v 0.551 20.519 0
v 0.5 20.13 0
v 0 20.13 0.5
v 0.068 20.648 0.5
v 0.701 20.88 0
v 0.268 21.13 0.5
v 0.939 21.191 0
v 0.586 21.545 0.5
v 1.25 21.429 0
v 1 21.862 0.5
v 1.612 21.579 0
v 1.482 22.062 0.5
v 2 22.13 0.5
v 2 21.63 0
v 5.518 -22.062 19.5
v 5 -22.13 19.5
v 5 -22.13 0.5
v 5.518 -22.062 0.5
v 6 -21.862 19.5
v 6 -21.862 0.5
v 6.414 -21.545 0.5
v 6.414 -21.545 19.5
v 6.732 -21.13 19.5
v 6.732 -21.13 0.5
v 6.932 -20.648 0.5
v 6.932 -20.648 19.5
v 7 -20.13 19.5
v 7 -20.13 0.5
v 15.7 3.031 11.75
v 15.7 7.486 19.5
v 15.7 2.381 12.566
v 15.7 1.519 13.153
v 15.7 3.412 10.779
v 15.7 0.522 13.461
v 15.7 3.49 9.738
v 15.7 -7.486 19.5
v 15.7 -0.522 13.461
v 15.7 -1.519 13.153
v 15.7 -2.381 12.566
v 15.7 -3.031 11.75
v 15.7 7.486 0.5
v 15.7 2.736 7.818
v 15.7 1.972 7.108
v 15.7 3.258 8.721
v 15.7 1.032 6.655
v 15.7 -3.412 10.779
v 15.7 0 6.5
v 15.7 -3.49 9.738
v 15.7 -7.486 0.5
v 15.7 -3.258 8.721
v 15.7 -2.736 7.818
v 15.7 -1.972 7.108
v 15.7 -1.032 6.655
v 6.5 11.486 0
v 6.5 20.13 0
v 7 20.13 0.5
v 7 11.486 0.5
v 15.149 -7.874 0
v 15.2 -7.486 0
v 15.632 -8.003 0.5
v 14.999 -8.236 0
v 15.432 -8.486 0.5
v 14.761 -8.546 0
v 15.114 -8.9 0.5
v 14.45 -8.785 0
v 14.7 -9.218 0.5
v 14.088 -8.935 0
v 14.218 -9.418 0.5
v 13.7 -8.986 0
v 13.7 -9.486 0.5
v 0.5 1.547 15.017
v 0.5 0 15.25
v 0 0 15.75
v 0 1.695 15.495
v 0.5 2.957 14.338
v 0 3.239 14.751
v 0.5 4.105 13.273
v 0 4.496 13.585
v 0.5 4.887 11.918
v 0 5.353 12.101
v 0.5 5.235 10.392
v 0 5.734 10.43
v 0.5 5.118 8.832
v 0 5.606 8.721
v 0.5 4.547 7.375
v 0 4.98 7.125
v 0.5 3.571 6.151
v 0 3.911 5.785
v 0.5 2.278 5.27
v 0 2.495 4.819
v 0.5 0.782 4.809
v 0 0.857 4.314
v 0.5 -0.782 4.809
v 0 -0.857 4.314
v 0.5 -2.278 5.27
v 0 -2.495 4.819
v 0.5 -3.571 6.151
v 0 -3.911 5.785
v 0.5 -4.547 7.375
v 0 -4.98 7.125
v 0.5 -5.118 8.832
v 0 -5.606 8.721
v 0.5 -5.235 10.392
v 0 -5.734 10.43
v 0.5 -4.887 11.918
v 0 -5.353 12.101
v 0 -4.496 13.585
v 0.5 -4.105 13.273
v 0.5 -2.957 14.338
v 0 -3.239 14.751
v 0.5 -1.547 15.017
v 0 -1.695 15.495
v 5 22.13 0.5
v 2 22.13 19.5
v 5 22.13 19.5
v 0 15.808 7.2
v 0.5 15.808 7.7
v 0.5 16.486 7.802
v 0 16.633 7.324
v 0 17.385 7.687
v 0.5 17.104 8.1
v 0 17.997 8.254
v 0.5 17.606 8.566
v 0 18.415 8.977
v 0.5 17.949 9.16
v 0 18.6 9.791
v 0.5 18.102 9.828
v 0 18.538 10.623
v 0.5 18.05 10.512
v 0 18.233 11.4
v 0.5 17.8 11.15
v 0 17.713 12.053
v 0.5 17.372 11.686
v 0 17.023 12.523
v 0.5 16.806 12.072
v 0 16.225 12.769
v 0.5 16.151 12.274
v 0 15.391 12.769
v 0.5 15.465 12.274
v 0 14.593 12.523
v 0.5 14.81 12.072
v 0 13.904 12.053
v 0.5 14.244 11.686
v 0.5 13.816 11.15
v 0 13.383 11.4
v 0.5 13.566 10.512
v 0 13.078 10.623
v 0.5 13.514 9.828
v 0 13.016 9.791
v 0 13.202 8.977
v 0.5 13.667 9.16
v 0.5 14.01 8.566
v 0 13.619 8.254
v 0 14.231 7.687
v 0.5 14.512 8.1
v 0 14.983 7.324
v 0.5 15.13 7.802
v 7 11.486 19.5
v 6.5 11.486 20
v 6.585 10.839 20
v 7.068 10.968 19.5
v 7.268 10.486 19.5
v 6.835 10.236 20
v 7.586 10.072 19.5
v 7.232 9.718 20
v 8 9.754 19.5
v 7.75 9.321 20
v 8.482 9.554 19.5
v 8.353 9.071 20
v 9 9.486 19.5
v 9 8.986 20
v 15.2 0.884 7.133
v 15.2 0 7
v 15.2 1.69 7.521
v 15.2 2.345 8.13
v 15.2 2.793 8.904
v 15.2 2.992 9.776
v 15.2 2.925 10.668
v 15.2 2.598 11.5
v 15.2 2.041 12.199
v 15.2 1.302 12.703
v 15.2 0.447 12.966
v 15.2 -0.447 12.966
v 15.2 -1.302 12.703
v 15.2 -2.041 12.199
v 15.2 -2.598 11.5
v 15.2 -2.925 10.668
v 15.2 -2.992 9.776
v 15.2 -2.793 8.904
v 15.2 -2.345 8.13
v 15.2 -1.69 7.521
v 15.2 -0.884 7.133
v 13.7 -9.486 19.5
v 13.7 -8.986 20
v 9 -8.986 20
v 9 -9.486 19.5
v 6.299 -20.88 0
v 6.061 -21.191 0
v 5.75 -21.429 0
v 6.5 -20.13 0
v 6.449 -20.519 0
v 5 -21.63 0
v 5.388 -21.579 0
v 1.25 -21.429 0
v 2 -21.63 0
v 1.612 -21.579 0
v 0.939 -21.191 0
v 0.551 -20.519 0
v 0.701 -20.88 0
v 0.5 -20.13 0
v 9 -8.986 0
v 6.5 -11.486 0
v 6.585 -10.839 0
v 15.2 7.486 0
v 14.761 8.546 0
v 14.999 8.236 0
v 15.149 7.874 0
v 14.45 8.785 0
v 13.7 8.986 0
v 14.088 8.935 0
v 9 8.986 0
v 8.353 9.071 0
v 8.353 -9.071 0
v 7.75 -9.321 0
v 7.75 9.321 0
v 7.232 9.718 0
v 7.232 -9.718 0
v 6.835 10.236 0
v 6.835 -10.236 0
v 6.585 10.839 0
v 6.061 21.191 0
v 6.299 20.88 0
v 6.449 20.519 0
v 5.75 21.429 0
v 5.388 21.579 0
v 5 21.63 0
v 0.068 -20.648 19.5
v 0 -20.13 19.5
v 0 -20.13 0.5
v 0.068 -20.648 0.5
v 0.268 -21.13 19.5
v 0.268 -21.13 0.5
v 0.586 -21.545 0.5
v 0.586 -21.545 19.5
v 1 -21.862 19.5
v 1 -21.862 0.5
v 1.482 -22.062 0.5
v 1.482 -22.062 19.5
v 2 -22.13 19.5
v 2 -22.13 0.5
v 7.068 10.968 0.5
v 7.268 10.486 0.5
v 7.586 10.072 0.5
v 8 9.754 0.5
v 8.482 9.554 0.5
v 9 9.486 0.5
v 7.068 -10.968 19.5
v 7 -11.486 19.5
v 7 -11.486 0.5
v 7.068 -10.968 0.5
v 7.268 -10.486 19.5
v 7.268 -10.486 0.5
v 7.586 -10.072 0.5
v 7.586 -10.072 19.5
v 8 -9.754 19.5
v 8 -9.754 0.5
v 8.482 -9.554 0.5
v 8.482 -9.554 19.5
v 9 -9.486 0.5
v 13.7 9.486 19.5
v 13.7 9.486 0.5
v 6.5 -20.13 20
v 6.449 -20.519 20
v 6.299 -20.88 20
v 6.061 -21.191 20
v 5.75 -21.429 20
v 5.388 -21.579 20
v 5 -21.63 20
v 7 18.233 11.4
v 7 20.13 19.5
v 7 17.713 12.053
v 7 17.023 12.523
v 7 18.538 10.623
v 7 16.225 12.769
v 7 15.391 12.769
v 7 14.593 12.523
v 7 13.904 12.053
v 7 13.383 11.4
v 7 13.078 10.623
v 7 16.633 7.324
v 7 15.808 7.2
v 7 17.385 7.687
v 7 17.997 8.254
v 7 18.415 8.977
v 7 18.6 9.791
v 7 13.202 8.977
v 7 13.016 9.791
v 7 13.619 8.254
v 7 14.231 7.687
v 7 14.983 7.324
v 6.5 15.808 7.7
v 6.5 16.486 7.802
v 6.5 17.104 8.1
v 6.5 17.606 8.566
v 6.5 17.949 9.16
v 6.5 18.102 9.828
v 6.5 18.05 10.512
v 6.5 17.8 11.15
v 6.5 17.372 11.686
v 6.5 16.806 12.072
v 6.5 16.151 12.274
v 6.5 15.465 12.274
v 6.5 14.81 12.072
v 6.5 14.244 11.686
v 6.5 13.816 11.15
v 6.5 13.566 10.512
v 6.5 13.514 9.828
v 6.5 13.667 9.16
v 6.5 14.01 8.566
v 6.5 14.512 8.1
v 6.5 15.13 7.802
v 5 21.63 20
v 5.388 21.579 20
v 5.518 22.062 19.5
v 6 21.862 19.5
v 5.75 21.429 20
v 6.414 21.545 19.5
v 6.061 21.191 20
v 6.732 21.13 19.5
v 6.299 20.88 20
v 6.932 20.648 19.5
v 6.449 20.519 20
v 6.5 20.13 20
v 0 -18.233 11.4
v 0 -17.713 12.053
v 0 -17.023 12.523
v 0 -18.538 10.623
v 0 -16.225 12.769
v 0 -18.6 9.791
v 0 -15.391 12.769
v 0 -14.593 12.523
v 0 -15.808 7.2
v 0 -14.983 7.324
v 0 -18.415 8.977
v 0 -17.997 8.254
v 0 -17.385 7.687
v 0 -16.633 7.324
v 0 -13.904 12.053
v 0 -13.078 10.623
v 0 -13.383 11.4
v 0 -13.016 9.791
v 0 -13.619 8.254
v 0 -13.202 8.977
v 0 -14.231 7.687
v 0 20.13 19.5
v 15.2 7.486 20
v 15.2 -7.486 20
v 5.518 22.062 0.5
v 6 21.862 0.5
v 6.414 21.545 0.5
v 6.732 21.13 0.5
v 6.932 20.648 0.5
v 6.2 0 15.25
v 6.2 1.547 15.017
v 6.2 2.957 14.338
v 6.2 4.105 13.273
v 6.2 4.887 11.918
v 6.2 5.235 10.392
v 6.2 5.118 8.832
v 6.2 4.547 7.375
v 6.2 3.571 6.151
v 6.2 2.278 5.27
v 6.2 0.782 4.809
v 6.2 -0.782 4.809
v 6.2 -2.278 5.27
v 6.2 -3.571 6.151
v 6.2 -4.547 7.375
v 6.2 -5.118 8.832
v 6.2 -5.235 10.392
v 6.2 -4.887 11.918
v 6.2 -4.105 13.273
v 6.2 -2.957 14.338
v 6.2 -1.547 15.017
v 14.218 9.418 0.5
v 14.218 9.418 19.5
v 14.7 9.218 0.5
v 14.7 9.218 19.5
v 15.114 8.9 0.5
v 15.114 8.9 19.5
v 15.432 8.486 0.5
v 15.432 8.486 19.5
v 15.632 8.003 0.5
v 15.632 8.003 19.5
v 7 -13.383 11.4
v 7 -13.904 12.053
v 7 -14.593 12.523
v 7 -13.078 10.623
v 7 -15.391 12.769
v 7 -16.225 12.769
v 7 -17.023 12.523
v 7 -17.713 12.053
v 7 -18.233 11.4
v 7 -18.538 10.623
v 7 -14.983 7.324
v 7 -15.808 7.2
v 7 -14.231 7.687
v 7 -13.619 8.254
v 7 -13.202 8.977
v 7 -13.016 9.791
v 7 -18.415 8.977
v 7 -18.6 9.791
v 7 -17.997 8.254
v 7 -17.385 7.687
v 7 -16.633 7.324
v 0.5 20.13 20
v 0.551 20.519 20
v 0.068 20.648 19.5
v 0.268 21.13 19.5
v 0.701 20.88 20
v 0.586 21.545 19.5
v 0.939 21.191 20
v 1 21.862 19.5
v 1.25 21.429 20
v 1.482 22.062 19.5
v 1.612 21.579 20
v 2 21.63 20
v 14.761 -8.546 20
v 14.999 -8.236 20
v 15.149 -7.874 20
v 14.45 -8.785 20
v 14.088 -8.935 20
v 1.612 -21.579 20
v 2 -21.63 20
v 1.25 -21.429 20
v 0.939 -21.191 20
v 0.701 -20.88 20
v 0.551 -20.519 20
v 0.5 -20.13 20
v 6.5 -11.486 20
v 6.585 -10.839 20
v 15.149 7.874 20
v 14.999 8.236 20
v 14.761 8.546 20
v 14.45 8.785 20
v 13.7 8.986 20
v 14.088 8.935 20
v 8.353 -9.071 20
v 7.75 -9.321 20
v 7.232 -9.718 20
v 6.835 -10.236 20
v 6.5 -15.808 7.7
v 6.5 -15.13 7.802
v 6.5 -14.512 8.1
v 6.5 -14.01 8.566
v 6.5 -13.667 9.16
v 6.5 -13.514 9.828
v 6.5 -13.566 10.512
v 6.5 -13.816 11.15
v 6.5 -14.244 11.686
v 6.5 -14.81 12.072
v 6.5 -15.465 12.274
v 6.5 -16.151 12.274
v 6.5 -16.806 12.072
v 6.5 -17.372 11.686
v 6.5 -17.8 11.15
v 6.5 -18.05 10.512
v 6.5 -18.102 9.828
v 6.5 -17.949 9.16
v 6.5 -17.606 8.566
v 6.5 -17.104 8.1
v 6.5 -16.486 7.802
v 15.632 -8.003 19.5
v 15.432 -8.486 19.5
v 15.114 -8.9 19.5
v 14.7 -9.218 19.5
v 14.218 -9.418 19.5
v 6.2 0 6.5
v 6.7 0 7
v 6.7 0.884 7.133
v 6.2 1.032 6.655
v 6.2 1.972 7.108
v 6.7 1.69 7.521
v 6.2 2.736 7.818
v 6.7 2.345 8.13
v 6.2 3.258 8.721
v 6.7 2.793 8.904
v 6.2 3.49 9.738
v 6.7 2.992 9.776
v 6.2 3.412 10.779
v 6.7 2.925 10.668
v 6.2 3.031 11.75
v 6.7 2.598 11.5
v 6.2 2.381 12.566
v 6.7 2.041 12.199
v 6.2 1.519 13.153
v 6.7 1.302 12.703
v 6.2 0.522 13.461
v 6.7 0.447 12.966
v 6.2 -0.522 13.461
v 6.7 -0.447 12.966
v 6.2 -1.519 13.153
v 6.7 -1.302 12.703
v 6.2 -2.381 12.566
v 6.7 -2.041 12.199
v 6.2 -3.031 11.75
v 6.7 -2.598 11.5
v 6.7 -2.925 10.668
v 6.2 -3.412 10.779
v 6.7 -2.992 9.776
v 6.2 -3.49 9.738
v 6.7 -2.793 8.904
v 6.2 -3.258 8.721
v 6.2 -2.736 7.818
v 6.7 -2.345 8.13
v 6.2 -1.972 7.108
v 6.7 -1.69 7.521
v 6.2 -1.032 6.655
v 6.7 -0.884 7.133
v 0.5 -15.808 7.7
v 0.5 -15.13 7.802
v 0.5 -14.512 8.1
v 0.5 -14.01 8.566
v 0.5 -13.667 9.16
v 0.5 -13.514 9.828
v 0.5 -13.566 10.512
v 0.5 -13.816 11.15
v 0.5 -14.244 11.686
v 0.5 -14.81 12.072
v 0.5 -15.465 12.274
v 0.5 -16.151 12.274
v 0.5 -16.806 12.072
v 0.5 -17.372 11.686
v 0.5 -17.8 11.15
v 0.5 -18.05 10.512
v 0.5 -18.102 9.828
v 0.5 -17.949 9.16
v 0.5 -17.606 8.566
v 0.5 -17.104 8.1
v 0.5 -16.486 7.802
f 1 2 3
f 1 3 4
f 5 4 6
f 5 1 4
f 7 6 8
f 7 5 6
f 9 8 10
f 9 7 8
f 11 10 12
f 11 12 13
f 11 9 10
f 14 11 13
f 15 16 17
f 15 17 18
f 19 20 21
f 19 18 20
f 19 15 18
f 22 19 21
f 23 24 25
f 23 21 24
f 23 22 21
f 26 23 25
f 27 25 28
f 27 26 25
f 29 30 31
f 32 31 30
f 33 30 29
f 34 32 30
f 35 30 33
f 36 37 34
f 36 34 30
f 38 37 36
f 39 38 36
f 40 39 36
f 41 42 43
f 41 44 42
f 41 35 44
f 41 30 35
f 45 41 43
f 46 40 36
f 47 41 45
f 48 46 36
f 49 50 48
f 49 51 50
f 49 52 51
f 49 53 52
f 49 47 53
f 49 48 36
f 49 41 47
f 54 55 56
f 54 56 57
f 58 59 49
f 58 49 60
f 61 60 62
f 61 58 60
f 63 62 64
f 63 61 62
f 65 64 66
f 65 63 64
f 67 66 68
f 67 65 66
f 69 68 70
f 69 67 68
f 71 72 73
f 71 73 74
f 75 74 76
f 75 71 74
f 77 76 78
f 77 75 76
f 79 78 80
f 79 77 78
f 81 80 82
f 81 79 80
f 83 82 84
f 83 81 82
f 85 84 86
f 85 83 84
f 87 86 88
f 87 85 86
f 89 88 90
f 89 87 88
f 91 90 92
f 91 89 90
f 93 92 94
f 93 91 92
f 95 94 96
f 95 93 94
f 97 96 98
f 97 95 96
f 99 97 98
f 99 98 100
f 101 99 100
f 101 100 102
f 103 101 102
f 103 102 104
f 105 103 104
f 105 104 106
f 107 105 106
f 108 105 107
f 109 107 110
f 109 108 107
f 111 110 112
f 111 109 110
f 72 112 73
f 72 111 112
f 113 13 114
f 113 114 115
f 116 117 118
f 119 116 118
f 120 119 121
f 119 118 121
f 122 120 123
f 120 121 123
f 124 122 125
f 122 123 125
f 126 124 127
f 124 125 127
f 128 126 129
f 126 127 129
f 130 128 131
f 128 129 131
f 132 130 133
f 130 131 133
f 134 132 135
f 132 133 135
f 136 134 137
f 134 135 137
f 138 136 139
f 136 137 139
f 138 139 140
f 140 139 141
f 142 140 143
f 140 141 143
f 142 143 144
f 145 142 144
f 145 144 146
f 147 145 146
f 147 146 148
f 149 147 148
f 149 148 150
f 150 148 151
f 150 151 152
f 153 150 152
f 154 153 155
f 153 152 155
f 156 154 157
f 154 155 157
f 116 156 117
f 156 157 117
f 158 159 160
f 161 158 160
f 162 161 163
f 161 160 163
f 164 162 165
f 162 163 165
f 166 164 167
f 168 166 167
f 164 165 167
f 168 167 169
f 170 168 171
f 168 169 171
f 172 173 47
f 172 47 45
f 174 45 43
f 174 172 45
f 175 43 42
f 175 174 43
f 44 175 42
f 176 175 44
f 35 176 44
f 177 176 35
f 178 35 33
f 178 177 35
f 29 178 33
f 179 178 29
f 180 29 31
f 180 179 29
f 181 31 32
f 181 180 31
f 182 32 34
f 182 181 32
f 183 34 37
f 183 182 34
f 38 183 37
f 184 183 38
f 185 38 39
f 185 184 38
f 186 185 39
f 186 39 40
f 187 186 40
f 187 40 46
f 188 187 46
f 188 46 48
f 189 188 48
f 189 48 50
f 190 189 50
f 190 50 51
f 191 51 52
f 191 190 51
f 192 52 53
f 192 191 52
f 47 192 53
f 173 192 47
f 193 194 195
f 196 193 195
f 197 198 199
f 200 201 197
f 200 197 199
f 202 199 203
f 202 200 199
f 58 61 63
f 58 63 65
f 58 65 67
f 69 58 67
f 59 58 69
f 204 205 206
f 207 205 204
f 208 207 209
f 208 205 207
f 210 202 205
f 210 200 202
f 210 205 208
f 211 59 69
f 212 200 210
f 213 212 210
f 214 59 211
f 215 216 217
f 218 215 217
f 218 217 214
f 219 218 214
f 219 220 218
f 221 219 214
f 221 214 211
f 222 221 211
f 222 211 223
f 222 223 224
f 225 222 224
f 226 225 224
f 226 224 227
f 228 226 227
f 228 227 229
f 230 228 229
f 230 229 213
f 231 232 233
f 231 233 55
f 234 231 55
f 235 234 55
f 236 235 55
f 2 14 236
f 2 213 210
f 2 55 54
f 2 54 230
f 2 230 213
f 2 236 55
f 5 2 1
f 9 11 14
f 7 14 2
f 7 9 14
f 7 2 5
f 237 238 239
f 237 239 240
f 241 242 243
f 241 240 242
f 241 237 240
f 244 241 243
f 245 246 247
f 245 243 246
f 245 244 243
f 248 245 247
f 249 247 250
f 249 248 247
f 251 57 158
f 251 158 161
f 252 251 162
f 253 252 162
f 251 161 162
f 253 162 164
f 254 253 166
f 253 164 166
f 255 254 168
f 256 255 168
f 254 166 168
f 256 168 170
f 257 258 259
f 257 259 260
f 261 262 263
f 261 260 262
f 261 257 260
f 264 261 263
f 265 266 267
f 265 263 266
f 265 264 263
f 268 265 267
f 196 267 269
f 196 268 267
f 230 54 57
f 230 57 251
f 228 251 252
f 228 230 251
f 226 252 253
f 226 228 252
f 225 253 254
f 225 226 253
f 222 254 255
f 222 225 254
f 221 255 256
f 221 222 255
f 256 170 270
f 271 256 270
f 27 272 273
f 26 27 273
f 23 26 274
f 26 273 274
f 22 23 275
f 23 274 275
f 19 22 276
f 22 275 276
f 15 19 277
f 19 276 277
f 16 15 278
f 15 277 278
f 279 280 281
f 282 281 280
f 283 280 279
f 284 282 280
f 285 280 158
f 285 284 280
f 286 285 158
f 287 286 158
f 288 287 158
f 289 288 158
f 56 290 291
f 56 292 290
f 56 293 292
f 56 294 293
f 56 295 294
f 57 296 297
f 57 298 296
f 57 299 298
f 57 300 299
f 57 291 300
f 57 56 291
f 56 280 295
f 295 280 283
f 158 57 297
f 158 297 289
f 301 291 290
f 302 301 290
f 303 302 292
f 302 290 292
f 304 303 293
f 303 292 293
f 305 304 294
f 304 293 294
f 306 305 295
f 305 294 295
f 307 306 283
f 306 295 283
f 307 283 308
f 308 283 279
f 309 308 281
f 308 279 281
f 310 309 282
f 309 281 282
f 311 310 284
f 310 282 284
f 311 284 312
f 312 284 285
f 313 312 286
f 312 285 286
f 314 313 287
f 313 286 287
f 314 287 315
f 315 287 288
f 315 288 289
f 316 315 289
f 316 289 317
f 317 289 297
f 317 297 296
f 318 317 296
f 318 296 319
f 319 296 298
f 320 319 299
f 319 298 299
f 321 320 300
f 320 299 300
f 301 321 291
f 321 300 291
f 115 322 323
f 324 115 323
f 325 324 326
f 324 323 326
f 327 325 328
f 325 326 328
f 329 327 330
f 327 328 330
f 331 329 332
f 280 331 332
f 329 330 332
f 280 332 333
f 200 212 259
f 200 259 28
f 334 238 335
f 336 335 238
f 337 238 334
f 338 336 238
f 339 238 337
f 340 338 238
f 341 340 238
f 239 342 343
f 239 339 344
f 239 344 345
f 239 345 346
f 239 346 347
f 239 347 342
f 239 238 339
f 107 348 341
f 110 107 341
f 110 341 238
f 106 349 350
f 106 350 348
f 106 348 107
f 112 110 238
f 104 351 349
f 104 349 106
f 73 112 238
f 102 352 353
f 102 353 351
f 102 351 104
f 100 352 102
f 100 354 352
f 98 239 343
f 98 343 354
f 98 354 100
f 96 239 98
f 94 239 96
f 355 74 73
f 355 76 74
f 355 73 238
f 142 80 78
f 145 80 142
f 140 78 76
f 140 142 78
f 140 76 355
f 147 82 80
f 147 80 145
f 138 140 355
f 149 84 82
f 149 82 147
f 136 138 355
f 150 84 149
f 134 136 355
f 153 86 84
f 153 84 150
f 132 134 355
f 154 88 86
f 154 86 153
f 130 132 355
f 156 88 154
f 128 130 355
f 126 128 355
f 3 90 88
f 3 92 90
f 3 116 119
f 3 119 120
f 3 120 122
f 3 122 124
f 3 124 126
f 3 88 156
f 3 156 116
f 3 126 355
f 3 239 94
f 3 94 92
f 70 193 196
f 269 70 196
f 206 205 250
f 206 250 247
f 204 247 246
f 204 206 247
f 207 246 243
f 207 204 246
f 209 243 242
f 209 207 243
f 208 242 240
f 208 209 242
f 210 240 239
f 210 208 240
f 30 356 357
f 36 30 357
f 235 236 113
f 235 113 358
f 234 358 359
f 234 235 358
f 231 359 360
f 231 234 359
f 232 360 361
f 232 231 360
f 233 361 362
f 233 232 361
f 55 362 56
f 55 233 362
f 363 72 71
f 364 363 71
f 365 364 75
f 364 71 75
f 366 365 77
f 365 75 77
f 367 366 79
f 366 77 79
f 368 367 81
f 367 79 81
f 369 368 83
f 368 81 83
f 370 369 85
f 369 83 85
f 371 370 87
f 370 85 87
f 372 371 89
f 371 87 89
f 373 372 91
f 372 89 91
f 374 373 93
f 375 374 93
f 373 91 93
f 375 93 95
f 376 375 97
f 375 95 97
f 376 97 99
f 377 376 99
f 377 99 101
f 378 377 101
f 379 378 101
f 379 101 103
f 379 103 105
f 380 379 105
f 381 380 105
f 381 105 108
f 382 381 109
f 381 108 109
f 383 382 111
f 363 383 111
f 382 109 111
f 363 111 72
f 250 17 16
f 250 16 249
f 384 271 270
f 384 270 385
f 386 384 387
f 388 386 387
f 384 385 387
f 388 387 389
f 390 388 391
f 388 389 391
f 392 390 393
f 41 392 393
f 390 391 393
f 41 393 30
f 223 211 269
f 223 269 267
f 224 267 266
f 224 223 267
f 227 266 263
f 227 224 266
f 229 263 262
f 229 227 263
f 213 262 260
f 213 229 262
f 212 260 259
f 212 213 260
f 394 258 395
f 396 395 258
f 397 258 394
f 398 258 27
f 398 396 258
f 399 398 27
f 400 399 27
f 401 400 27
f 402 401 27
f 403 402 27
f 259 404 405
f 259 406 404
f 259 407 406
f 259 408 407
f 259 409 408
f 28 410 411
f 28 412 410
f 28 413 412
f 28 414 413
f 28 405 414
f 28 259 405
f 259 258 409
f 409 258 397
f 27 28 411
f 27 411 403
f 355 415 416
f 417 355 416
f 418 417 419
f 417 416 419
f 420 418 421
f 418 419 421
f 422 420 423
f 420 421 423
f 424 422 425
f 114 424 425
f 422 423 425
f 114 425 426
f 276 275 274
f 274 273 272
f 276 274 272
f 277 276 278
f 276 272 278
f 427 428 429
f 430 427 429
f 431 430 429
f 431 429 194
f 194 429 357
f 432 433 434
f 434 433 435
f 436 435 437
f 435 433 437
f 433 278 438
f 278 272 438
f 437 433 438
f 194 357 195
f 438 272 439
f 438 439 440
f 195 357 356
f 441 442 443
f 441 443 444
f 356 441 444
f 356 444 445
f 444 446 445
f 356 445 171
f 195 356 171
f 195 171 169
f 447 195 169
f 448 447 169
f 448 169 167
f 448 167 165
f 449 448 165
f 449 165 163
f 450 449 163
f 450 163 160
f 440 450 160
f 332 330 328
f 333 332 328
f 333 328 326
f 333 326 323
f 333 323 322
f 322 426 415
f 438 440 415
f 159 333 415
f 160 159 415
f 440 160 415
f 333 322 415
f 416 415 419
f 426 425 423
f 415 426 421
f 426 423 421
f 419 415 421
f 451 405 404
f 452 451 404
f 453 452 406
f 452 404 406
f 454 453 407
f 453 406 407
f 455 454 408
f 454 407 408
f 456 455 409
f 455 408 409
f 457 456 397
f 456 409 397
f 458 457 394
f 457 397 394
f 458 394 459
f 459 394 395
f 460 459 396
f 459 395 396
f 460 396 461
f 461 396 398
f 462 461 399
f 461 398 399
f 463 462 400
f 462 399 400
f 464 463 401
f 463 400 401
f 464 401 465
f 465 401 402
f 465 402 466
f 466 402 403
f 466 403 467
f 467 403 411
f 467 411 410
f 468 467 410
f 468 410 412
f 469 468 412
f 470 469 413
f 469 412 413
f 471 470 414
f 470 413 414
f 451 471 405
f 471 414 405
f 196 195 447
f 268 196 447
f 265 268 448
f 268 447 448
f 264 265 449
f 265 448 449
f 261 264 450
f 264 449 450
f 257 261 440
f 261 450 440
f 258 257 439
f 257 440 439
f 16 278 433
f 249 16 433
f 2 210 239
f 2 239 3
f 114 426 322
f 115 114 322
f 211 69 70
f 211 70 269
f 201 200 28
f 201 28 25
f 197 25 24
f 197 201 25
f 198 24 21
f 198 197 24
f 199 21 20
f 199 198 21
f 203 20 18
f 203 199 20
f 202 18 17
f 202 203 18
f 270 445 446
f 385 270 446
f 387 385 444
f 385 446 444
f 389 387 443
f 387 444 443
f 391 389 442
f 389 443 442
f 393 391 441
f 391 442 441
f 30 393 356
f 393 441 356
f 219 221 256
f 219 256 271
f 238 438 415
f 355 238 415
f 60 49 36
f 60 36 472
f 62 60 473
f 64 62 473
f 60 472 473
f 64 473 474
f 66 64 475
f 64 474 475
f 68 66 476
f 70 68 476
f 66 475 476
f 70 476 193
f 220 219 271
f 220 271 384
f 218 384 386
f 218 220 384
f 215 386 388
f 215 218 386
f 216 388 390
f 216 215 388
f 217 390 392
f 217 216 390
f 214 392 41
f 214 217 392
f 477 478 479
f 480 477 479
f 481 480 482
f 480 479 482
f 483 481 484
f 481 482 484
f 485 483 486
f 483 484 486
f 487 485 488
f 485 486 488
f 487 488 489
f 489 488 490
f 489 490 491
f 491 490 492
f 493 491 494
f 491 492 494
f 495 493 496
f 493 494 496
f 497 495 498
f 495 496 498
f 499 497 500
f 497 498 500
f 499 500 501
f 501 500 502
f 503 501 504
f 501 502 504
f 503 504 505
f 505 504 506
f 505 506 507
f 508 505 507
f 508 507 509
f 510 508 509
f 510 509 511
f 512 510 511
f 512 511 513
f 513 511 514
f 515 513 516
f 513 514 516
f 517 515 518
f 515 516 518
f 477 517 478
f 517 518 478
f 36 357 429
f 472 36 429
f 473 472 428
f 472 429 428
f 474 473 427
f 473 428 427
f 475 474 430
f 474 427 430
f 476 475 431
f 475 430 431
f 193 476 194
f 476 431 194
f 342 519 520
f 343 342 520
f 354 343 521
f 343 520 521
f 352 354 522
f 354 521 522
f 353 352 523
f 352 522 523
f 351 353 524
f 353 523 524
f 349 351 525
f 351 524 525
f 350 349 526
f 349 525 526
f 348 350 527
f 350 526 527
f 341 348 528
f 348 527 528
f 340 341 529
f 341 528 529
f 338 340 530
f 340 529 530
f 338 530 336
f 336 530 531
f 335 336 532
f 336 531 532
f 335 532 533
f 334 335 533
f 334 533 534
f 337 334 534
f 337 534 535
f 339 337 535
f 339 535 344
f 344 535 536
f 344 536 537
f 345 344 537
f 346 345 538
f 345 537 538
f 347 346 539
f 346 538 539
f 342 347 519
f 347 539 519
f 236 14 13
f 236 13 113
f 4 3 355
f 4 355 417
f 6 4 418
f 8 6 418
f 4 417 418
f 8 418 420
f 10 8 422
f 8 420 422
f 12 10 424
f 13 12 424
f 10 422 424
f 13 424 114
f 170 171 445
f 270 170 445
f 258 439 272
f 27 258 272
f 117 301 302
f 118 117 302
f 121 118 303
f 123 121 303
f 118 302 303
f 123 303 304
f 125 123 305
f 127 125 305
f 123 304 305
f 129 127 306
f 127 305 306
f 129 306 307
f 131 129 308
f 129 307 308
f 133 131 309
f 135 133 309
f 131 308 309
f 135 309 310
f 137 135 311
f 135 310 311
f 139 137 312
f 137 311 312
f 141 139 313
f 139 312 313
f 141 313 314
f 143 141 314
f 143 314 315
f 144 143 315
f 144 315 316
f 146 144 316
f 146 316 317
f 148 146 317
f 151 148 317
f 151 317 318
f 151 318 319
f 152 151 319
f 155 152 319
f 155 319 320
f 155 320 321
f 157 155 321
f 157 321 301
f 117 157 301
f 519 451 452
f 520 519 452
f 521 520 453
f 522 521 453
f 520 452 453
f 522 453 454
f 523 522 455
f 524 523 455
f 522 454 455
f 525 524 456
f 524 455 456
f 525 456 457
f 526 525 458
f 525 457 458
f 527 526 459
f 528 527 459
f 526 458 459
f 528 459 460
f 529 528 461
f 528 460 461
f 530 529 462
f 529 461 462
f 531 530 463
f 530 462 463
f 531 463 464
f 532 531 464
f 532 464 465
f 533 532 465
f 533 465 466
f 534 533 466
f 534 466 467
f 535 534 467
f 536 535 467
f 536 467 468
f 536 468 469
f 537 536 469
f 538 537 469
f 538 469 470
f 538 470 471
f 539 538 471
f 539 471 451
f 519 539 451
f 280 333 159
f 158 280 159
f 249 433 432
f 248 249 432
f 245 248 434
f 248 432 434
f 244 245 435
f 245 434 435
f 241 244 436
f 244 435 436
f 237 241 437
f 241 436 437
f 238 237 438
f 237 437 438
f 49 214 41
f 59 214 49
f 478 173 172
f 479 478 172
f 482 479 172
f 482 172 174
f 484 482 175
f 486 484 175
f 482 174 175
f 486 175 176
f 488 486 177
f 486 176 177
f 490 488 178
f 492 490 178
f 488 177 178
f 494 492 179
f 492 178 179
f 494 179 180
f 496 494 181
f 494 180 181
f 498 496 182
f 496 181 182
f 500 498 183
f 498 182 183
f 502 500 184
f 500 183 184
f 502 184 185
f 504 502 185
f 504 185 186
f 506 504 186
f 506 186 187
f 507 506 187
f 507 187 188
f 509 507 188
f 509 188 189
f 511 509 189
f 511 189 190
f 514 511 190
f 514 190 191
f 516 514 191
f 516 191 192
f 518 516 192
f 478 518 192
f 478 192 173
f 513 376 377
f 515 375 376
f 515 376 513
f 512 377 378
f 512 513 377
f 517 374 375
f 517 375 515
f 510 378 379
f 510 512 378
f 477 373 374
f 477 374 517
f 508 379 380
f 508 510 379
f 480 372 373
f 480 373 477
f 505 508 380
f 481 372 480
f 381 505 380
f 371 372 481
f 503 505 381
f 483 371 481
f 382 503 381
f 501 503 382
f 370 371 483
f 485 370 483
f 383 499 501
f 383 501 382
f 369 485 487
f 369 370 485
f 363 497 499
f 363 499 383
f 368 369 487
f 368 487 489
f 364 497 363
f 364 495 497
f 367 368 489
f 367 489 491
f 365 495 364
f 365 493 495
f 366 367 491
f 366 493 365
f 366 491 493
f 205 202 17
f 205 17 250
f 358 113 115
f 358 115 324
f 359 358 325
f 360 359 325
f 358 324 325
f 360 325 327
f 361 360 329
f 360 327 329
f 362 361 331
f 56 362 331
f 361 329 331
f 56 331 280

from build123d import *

# Parameters (mm, degrees)
AUFSATZ_LINEAR_AUSTRAGEN1_DEPTH = 20
SKIZZE2_R                       = 3
SCHNITT_LINEAR_AUSTRAGEN1_DEPTH = 20
SKIZZE3_R                       = 5.25
SCHNITT_LINEAR_AUSTRAGEN2_DEPTH = 6.2
SKIZZE4_R                       = 2.3
SCHNITT_LINEAR_AUSTRAGEN3_DEPTH = 10
VERRUNDUNG1_R                   = 2
FASE1_SIZE                      = 0.5


with BuildPart() as part:
    # Skizze1 → Aufsatz-Linear austragen1 (new body)
    with BuildSketch(Plane.XY):
        Polygon((0, -22.130332374), (0, 22.130332374), (7, 22.130332374), (7, 9.485781443), (15.7, 9.485781443), (15.7, -9.485781443), (7, -9.485781443), (7, -22.130332374), align=None)
    extrude(amount=AUFSATZ_LINEAR_AUSTRAGEN1_DEPTH)

    # Skizze2 → Schnitt-Linear austragen1 (cut)
    with BuildSketch(Plane(origin=(15.7, 0, 0), x_dir=(0, 0, -1), z_dir=(1, 0, 0))):
        with Locations((-10, 0)):
            Circle(SKIZZE2_R)
    extrude(amount=-SCHNITT_LINEAR_AUSTRAGEN1_DEPTH, mode=Mode.SUBTRACT)

    # Skizze3 → Schnitt-Linear austragen2 (cut)
    with BuildSketch(Plane.ZY):
        with Locations((10, 0)):
            Circle(SKIZZE3_R)
    extrude(amount=-SCHNITT_LINEAR_AUSTRAGEN2_DEPTH, mode=Mode.SUBTRACT)

    # Skizze4 → Schnitt-Linear austragen3 (cut)
    with BuildSketch(Plane(origin=(7, 0, 0), x_dir=(0, 0, -1), z_dir=(1, 0, 0))):
        with Locations((-10, -15.808056909)):
            Circle(SKIZZE4_R)
        with Locations((-10, 15.808056909)):
            Circle(SKIZZE4_R)
    extrude(amount=-SCHNITT_LINEAR_AUSTRAGEN3_DEPTH, mode=Mode.SUBTRACT)

    # Verrundung1
    verrundung1_edges = [part.edges().sort_by_distance(p)[0] for p in [
        (7, -9.485781443, 10),
        (7, -22.130332374, 10),
        (0, -22.130332374, 10),
        (0, 22.130332374, 10),
        (7, 22.130332374, 10),
        (7, 9.485781443, 10),
        (15.7, 9.485781443, 10),
        (15.7, -9.485781443, 10),
    ]]
    fillet(verrundung1_edges, radius=VERRUNDUNG1_R)

    # Fase1
    fase1_edges = [part.edges().sort_by_distance(p)[0] for p in [
        (15.7, 0, 13),
        (0, 0, 4.75),
        (6.2, 0, 13),
        (0, -15.808056909, 12.3),
        (7, -15.808056909, 12.3),
        (0, 15.808056909, 12.3),
        (7, 15.808056909, 12.3),
        (0, 0, 0),
        (0, 0, 20),
        (11.35, -9.485781443, 0),
        (7, -15.808056909, 0),
        (3.5, -22.130332374, 0),
        (3.5, 22.130332374, 0),
        (7, 15.808056909, 0),
        (11.35, 9.485781443, 0),
        (15.7, 0, 0),
        (0.585786438, -21.544545937, 0),
        (6.414213562, -21.544545937, 0),
        (15.114213562, -8.899995006, 0),
        (15.114213562, 8.899995006, 0),
        (6.414213562, 21.544545937, 0),
        (0.585786438, 21.544545937, 0),
        (3.5, 22.130332374, 20),
        (11.35, -9.485781443, 20),
        (15.7, 0, 20),
        (11.35, 9.485781443, 20),
        (7, 15.808056909, 20),
        (3.5, -22.130332374, 20),
        (7, -15.808056909, 20),
        (0.585786438, -21.544545937, 20),
        (6.414213562, -21.544545937, 20),
        (15.114213562, -8.899995006, 20),
        (15.114213562, 8.899995006, 20),
        (6.414213562, 21.544545937, 20),
        (0.585786438, 21.544545937, 20),
        (7.585786438, -10.071567881, 0),
        (7.585786438, -10.071567881, 20),
        (7.585786438, 10.071567881, 0),
        (7.585786438, 10.071567881, 20),
    ]]
    chamfer(fase1_edges, length=FASE1_SIZE)


solid = part.part
